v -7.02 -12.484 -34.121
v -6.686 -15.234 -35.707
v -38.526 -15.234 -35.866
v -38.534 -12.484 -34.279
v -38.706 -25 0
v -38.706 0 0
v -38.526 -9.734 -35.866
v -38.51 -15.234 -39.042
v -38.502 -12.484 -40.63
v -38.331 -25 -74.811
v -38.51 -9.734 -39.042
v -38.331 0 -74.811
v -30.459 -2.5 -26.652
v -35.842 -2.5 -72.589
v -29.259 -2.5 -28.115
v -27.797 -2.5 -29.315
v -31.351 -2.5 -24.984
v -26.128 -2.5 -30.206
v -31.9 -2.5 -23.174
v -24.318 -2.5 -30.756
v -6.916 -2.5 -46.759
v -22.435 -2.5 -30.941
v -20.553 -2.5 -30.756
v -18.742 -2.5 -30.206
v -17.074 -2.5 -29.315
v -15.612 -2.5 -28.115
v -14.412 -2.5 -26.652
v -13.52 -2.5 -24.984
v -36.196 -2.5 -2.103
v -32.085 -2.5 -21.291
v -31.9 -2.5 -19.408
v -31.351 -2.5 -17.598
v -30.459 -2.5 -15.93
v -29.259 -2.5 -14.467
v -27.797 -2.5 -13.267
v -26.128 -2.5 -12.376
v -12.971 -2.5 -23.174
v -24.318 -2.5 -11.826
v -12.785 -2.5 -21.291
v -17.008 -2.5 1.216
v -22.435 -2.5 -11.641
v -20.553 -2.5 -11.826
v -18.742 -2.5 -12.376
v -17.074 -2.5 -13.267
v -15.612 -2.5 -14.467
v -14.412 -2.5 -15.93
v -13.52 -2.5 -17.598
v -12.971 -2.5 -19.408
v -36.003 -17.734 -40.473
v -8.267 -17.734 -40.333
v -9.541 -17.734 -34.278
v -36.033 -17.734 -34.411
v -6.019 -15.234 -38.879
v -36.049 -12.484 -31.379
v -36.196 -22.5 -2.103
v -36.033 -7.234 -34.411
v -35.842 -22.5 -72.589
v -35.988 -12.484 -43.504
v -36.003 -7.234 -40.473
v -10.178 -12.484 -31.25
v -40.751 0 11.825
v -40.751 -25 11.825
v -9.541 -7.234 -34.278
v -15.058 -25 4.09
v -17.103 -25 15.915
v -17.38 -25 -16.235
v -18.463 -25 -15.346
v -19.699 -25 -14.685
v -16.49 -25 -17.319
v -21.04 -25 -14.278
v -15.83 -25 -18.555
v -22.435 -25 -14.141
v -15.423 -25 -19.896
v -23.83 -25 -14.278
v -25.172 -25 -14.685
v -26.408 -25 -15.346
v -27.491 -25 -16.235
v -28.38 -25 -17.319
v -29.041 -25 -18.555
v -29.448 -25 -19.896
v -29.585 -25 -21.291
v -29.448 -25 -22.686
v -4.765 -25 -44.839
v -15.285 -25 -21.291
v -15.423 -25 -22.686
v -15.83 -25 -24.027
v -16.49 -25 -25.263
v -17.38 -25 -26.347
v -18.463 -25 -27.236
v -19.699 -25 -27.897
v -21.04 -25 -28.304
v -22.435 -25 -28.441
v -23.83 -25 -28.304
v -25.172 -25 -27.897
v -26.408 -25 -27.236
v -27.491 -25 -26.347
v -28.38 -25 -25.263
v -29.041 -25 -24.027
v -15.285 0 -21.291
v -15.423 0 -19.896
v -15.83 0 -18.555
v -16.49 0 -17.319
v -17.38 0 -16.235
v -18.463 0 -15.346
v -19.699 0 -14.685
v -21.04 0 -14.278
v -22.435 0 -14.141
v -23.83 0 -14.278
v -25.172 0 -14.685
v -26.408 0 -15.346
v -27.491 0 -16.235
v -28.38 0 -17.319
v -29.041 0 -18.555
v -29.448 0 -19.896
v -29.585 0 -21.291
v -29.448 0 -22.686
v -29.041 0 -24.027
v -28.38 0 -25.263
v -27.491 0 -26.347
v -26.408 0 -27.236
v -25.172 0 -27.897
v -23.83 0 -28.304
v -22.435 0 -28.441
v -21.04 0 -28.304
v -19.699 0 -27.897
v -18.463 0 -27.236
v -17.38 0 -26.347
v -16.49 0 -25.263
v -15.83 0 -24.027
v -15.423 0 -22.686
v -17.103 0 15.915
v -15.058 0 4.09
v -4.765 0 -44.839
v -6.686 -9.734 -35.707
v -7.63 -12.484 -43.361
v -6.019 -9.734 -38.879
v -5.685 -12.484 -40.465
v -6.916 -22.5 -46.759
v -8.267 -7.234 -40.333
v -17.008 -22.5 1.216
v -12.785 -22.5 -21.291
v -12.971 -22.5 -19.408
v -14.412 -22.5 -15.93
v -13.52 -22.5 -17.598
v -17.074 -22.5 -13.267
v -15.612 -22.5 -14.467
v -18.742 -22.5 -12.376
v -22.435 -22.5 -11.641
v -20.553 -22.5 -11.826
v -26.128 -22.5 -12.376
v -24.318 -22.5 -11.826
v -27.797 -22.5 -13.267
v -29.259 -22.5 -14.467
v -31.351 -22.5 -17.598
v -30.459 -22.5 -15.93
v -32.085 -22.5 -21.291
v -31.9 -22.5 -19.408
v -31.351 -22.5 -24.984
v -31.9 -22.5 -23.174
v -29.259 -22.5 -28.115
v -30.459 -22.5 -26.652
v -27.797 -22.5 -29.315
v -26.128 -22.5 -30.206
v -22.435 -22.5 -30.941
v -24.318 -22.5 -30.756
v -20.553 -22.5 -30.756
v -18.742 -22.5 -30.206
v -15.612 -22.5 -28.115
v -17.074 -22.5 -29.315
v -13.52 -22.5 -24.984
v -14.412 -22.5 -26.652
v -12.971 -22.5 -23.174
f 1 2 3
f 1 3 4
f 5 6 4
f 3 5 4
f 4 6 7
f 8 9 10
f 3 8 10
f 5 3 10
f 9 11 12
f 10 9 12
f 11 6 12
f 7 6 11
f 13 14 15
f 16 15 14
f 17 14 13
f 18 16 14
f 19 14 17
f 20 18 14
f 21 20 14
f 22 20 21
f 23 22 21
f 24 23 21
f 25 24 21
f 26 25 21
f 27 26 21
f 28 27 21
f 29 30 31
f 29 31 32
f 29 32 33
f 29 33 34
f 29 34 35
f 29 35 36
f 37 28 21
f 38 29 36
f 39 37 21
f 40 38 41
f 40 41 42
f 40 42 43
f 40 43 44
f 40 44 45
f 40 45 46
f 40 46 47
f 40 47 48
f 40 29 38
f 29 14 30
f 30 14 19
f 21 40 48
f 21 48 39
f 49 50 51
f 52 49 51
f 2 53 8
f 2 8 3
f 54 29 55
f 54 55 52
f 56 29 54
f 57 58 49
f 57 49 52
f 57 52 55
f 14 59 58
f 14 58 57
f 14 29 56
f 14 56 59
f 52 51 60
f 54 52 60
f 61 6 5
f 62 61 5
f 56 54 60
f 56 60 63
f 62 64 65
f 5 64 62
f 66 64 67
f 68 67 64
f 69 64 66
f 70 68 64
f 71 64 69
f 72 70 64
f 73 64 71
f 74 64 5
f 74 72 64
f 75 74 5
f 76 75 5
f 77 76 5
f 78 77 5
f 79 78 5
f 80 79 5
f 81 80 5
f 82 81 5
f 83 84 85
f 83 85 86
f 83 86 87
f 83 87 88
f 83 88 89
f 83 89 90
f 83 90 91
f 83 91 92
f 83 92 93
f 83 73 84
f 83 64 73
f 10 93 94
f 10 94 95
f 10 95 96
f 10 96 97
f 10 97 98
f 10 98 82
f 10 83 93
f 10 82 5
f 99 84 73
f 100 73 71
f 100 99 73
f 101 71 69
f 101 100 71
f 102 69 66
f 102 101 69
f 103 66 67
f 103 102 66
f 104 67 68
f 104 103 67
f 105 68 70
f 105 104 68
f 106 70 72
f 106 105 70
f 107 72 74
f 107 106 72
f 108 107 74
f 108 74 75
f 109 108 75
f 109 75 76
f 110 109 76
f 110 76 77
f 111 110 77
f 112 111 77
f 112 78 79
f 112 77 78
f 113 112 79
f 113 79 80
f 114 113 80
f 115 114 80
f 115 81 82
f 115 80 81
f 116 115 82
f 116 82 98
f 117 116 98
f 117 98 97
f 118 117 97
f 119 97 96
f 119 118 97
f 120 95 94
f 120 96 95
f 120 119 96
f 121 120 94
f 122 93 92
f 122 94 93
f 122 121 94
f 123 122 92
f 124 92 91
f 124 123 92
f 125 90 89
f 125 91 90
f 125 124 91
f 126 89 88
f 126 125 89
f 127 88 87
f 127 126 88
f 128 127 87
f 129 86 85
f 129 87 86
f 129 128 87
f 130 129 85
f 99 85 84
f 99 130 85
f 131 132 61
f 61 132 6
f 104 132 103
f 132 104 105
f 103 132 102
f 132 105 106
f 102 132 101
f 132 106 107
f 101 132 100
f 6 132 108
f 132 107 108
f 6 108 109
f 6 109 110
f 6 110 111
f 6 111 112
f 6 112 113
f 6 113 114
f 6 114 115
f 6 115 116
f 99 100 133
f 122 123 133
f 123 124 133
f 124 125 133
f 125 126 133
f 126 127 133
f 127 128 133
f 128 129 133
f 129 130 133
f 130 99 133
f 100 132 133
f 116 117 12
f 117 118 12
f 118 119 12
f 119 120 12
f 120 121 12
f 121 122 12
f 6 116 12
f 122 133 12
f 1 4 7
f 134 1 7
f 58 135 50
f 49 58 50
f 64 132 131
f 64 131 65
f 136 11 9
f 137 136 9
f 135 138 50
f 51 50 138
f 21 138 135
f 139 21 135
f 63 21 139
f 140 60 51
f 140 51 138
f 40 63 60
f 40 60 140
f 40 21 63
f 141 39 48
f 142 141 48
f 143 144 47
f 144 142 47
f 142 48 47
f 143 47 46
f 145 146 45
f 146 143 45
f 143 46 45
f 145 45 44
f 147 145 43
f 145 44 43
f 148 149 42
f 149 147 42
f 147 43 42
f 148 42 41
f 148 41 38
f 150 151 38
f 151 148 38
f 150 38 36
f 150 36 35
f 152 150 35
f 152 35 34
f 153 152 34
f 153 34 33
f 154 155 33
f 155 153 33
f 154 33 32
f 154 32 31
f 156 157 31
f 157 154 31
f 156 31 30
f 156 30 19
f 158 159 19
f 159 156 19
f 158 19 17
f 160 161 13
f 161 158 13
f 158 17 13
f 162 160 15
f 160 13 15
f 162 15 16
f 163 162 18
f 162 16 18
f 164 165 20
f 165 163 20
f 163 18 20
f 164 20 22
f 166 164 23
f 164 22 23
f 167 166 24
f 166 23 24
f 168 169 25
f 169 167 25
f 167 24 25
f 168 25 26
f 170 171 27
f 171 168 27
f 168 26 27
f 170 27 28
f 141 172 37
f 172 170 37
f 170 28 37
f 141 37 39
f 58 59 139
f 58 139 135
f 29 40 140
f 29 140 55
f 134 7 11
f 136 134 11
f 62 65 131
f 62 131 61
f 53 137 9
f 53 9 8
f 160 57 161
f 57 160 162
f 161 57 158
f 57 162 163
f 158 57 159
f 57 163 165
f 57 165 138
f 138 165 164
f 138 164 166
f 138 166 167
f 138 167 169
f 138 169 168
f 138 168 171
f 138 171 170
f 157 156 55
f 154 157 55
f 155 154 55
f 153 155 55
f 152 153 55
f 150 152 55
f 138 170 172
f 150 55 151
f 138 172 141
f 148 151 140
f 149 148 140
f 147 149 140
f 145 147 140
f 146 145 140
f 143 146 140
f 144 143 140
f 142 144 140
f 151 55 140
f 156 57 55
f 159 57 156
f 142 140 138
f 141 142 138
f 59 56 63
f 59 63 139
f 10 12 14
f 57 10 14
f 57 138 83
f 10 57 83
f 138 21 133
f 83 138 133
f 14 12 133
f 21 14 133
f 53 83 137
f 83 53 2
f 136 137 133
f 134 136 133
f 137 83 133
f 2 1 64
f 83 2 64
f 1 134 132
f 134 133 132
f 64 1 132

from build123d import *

# Parameters (mm, degrees)
F2_DEPTH = 25
F1_R     = 7.15
F3_DEPTH = 25.4
F6_DEPTH = 35.2
F7_T     = -2.5
F8_DEPTH = 12


with BuildPart() as f2:
    # F0 (on Front) → F2 (new body)
    with BuildSketch(Plane.XZ):
        Polygon((-15.0582233108, 4.0902668196), (-38.706164358, 0.000163102), (-38.330538716, -74.8110767319), (-4.764814752, -44.8387198881), align=None)
    extrude(amount=F2_DEPTH)

    # F1 (on Front) → F3 (cut)
    with BuildSketch(Plane.XZ):
        with Locations((-22.4353701932, -21.2910585503)):
            Circle(F1_R)
    extrude(amount=F3_DEPTH, mode=Mode.SUBTRACT)

    # F5 (on face) → F6 (cut, symmetric)
    with BuildSketch(Plane(origin=(-38.7051877725, 0, -0.1943379235), x_dir=(0, -1, 0), z_dir=(-0.9999873951, 0, -0.0050209154))):
        Polygon((15.2337295342, -35.6725638611), (12.4837295342, -34.0848506209), (9.7337295342, -35.6725638611), (9.7337295342, -38.8479903417), (12.4837295342, -40.435703582), (15.2337295342, -38.8479903417), align=None)
    extrude(amount=F6_DEPTH, both=True, mode=Mode.SUBTRACT)

    # F7
    f7_openings = [f2.faces().sort_by_distance(p)[0] for p in [
        (-21.547677, -12.5, -59.824898),
    ]]
    offset(amount=F7_T, openings=f7_openings, kind=Kind.INTERSECTION)

    # F8 (add): a face of the model
    f8_faces = [f2.faces().sort_by_distance(p)[0] for p in [
        (-26.8821938344, -12.5, 2.0452149608),
    ]]
    extrude(f8_faces, amount=F8_DEPTH)


solid = f2.part
